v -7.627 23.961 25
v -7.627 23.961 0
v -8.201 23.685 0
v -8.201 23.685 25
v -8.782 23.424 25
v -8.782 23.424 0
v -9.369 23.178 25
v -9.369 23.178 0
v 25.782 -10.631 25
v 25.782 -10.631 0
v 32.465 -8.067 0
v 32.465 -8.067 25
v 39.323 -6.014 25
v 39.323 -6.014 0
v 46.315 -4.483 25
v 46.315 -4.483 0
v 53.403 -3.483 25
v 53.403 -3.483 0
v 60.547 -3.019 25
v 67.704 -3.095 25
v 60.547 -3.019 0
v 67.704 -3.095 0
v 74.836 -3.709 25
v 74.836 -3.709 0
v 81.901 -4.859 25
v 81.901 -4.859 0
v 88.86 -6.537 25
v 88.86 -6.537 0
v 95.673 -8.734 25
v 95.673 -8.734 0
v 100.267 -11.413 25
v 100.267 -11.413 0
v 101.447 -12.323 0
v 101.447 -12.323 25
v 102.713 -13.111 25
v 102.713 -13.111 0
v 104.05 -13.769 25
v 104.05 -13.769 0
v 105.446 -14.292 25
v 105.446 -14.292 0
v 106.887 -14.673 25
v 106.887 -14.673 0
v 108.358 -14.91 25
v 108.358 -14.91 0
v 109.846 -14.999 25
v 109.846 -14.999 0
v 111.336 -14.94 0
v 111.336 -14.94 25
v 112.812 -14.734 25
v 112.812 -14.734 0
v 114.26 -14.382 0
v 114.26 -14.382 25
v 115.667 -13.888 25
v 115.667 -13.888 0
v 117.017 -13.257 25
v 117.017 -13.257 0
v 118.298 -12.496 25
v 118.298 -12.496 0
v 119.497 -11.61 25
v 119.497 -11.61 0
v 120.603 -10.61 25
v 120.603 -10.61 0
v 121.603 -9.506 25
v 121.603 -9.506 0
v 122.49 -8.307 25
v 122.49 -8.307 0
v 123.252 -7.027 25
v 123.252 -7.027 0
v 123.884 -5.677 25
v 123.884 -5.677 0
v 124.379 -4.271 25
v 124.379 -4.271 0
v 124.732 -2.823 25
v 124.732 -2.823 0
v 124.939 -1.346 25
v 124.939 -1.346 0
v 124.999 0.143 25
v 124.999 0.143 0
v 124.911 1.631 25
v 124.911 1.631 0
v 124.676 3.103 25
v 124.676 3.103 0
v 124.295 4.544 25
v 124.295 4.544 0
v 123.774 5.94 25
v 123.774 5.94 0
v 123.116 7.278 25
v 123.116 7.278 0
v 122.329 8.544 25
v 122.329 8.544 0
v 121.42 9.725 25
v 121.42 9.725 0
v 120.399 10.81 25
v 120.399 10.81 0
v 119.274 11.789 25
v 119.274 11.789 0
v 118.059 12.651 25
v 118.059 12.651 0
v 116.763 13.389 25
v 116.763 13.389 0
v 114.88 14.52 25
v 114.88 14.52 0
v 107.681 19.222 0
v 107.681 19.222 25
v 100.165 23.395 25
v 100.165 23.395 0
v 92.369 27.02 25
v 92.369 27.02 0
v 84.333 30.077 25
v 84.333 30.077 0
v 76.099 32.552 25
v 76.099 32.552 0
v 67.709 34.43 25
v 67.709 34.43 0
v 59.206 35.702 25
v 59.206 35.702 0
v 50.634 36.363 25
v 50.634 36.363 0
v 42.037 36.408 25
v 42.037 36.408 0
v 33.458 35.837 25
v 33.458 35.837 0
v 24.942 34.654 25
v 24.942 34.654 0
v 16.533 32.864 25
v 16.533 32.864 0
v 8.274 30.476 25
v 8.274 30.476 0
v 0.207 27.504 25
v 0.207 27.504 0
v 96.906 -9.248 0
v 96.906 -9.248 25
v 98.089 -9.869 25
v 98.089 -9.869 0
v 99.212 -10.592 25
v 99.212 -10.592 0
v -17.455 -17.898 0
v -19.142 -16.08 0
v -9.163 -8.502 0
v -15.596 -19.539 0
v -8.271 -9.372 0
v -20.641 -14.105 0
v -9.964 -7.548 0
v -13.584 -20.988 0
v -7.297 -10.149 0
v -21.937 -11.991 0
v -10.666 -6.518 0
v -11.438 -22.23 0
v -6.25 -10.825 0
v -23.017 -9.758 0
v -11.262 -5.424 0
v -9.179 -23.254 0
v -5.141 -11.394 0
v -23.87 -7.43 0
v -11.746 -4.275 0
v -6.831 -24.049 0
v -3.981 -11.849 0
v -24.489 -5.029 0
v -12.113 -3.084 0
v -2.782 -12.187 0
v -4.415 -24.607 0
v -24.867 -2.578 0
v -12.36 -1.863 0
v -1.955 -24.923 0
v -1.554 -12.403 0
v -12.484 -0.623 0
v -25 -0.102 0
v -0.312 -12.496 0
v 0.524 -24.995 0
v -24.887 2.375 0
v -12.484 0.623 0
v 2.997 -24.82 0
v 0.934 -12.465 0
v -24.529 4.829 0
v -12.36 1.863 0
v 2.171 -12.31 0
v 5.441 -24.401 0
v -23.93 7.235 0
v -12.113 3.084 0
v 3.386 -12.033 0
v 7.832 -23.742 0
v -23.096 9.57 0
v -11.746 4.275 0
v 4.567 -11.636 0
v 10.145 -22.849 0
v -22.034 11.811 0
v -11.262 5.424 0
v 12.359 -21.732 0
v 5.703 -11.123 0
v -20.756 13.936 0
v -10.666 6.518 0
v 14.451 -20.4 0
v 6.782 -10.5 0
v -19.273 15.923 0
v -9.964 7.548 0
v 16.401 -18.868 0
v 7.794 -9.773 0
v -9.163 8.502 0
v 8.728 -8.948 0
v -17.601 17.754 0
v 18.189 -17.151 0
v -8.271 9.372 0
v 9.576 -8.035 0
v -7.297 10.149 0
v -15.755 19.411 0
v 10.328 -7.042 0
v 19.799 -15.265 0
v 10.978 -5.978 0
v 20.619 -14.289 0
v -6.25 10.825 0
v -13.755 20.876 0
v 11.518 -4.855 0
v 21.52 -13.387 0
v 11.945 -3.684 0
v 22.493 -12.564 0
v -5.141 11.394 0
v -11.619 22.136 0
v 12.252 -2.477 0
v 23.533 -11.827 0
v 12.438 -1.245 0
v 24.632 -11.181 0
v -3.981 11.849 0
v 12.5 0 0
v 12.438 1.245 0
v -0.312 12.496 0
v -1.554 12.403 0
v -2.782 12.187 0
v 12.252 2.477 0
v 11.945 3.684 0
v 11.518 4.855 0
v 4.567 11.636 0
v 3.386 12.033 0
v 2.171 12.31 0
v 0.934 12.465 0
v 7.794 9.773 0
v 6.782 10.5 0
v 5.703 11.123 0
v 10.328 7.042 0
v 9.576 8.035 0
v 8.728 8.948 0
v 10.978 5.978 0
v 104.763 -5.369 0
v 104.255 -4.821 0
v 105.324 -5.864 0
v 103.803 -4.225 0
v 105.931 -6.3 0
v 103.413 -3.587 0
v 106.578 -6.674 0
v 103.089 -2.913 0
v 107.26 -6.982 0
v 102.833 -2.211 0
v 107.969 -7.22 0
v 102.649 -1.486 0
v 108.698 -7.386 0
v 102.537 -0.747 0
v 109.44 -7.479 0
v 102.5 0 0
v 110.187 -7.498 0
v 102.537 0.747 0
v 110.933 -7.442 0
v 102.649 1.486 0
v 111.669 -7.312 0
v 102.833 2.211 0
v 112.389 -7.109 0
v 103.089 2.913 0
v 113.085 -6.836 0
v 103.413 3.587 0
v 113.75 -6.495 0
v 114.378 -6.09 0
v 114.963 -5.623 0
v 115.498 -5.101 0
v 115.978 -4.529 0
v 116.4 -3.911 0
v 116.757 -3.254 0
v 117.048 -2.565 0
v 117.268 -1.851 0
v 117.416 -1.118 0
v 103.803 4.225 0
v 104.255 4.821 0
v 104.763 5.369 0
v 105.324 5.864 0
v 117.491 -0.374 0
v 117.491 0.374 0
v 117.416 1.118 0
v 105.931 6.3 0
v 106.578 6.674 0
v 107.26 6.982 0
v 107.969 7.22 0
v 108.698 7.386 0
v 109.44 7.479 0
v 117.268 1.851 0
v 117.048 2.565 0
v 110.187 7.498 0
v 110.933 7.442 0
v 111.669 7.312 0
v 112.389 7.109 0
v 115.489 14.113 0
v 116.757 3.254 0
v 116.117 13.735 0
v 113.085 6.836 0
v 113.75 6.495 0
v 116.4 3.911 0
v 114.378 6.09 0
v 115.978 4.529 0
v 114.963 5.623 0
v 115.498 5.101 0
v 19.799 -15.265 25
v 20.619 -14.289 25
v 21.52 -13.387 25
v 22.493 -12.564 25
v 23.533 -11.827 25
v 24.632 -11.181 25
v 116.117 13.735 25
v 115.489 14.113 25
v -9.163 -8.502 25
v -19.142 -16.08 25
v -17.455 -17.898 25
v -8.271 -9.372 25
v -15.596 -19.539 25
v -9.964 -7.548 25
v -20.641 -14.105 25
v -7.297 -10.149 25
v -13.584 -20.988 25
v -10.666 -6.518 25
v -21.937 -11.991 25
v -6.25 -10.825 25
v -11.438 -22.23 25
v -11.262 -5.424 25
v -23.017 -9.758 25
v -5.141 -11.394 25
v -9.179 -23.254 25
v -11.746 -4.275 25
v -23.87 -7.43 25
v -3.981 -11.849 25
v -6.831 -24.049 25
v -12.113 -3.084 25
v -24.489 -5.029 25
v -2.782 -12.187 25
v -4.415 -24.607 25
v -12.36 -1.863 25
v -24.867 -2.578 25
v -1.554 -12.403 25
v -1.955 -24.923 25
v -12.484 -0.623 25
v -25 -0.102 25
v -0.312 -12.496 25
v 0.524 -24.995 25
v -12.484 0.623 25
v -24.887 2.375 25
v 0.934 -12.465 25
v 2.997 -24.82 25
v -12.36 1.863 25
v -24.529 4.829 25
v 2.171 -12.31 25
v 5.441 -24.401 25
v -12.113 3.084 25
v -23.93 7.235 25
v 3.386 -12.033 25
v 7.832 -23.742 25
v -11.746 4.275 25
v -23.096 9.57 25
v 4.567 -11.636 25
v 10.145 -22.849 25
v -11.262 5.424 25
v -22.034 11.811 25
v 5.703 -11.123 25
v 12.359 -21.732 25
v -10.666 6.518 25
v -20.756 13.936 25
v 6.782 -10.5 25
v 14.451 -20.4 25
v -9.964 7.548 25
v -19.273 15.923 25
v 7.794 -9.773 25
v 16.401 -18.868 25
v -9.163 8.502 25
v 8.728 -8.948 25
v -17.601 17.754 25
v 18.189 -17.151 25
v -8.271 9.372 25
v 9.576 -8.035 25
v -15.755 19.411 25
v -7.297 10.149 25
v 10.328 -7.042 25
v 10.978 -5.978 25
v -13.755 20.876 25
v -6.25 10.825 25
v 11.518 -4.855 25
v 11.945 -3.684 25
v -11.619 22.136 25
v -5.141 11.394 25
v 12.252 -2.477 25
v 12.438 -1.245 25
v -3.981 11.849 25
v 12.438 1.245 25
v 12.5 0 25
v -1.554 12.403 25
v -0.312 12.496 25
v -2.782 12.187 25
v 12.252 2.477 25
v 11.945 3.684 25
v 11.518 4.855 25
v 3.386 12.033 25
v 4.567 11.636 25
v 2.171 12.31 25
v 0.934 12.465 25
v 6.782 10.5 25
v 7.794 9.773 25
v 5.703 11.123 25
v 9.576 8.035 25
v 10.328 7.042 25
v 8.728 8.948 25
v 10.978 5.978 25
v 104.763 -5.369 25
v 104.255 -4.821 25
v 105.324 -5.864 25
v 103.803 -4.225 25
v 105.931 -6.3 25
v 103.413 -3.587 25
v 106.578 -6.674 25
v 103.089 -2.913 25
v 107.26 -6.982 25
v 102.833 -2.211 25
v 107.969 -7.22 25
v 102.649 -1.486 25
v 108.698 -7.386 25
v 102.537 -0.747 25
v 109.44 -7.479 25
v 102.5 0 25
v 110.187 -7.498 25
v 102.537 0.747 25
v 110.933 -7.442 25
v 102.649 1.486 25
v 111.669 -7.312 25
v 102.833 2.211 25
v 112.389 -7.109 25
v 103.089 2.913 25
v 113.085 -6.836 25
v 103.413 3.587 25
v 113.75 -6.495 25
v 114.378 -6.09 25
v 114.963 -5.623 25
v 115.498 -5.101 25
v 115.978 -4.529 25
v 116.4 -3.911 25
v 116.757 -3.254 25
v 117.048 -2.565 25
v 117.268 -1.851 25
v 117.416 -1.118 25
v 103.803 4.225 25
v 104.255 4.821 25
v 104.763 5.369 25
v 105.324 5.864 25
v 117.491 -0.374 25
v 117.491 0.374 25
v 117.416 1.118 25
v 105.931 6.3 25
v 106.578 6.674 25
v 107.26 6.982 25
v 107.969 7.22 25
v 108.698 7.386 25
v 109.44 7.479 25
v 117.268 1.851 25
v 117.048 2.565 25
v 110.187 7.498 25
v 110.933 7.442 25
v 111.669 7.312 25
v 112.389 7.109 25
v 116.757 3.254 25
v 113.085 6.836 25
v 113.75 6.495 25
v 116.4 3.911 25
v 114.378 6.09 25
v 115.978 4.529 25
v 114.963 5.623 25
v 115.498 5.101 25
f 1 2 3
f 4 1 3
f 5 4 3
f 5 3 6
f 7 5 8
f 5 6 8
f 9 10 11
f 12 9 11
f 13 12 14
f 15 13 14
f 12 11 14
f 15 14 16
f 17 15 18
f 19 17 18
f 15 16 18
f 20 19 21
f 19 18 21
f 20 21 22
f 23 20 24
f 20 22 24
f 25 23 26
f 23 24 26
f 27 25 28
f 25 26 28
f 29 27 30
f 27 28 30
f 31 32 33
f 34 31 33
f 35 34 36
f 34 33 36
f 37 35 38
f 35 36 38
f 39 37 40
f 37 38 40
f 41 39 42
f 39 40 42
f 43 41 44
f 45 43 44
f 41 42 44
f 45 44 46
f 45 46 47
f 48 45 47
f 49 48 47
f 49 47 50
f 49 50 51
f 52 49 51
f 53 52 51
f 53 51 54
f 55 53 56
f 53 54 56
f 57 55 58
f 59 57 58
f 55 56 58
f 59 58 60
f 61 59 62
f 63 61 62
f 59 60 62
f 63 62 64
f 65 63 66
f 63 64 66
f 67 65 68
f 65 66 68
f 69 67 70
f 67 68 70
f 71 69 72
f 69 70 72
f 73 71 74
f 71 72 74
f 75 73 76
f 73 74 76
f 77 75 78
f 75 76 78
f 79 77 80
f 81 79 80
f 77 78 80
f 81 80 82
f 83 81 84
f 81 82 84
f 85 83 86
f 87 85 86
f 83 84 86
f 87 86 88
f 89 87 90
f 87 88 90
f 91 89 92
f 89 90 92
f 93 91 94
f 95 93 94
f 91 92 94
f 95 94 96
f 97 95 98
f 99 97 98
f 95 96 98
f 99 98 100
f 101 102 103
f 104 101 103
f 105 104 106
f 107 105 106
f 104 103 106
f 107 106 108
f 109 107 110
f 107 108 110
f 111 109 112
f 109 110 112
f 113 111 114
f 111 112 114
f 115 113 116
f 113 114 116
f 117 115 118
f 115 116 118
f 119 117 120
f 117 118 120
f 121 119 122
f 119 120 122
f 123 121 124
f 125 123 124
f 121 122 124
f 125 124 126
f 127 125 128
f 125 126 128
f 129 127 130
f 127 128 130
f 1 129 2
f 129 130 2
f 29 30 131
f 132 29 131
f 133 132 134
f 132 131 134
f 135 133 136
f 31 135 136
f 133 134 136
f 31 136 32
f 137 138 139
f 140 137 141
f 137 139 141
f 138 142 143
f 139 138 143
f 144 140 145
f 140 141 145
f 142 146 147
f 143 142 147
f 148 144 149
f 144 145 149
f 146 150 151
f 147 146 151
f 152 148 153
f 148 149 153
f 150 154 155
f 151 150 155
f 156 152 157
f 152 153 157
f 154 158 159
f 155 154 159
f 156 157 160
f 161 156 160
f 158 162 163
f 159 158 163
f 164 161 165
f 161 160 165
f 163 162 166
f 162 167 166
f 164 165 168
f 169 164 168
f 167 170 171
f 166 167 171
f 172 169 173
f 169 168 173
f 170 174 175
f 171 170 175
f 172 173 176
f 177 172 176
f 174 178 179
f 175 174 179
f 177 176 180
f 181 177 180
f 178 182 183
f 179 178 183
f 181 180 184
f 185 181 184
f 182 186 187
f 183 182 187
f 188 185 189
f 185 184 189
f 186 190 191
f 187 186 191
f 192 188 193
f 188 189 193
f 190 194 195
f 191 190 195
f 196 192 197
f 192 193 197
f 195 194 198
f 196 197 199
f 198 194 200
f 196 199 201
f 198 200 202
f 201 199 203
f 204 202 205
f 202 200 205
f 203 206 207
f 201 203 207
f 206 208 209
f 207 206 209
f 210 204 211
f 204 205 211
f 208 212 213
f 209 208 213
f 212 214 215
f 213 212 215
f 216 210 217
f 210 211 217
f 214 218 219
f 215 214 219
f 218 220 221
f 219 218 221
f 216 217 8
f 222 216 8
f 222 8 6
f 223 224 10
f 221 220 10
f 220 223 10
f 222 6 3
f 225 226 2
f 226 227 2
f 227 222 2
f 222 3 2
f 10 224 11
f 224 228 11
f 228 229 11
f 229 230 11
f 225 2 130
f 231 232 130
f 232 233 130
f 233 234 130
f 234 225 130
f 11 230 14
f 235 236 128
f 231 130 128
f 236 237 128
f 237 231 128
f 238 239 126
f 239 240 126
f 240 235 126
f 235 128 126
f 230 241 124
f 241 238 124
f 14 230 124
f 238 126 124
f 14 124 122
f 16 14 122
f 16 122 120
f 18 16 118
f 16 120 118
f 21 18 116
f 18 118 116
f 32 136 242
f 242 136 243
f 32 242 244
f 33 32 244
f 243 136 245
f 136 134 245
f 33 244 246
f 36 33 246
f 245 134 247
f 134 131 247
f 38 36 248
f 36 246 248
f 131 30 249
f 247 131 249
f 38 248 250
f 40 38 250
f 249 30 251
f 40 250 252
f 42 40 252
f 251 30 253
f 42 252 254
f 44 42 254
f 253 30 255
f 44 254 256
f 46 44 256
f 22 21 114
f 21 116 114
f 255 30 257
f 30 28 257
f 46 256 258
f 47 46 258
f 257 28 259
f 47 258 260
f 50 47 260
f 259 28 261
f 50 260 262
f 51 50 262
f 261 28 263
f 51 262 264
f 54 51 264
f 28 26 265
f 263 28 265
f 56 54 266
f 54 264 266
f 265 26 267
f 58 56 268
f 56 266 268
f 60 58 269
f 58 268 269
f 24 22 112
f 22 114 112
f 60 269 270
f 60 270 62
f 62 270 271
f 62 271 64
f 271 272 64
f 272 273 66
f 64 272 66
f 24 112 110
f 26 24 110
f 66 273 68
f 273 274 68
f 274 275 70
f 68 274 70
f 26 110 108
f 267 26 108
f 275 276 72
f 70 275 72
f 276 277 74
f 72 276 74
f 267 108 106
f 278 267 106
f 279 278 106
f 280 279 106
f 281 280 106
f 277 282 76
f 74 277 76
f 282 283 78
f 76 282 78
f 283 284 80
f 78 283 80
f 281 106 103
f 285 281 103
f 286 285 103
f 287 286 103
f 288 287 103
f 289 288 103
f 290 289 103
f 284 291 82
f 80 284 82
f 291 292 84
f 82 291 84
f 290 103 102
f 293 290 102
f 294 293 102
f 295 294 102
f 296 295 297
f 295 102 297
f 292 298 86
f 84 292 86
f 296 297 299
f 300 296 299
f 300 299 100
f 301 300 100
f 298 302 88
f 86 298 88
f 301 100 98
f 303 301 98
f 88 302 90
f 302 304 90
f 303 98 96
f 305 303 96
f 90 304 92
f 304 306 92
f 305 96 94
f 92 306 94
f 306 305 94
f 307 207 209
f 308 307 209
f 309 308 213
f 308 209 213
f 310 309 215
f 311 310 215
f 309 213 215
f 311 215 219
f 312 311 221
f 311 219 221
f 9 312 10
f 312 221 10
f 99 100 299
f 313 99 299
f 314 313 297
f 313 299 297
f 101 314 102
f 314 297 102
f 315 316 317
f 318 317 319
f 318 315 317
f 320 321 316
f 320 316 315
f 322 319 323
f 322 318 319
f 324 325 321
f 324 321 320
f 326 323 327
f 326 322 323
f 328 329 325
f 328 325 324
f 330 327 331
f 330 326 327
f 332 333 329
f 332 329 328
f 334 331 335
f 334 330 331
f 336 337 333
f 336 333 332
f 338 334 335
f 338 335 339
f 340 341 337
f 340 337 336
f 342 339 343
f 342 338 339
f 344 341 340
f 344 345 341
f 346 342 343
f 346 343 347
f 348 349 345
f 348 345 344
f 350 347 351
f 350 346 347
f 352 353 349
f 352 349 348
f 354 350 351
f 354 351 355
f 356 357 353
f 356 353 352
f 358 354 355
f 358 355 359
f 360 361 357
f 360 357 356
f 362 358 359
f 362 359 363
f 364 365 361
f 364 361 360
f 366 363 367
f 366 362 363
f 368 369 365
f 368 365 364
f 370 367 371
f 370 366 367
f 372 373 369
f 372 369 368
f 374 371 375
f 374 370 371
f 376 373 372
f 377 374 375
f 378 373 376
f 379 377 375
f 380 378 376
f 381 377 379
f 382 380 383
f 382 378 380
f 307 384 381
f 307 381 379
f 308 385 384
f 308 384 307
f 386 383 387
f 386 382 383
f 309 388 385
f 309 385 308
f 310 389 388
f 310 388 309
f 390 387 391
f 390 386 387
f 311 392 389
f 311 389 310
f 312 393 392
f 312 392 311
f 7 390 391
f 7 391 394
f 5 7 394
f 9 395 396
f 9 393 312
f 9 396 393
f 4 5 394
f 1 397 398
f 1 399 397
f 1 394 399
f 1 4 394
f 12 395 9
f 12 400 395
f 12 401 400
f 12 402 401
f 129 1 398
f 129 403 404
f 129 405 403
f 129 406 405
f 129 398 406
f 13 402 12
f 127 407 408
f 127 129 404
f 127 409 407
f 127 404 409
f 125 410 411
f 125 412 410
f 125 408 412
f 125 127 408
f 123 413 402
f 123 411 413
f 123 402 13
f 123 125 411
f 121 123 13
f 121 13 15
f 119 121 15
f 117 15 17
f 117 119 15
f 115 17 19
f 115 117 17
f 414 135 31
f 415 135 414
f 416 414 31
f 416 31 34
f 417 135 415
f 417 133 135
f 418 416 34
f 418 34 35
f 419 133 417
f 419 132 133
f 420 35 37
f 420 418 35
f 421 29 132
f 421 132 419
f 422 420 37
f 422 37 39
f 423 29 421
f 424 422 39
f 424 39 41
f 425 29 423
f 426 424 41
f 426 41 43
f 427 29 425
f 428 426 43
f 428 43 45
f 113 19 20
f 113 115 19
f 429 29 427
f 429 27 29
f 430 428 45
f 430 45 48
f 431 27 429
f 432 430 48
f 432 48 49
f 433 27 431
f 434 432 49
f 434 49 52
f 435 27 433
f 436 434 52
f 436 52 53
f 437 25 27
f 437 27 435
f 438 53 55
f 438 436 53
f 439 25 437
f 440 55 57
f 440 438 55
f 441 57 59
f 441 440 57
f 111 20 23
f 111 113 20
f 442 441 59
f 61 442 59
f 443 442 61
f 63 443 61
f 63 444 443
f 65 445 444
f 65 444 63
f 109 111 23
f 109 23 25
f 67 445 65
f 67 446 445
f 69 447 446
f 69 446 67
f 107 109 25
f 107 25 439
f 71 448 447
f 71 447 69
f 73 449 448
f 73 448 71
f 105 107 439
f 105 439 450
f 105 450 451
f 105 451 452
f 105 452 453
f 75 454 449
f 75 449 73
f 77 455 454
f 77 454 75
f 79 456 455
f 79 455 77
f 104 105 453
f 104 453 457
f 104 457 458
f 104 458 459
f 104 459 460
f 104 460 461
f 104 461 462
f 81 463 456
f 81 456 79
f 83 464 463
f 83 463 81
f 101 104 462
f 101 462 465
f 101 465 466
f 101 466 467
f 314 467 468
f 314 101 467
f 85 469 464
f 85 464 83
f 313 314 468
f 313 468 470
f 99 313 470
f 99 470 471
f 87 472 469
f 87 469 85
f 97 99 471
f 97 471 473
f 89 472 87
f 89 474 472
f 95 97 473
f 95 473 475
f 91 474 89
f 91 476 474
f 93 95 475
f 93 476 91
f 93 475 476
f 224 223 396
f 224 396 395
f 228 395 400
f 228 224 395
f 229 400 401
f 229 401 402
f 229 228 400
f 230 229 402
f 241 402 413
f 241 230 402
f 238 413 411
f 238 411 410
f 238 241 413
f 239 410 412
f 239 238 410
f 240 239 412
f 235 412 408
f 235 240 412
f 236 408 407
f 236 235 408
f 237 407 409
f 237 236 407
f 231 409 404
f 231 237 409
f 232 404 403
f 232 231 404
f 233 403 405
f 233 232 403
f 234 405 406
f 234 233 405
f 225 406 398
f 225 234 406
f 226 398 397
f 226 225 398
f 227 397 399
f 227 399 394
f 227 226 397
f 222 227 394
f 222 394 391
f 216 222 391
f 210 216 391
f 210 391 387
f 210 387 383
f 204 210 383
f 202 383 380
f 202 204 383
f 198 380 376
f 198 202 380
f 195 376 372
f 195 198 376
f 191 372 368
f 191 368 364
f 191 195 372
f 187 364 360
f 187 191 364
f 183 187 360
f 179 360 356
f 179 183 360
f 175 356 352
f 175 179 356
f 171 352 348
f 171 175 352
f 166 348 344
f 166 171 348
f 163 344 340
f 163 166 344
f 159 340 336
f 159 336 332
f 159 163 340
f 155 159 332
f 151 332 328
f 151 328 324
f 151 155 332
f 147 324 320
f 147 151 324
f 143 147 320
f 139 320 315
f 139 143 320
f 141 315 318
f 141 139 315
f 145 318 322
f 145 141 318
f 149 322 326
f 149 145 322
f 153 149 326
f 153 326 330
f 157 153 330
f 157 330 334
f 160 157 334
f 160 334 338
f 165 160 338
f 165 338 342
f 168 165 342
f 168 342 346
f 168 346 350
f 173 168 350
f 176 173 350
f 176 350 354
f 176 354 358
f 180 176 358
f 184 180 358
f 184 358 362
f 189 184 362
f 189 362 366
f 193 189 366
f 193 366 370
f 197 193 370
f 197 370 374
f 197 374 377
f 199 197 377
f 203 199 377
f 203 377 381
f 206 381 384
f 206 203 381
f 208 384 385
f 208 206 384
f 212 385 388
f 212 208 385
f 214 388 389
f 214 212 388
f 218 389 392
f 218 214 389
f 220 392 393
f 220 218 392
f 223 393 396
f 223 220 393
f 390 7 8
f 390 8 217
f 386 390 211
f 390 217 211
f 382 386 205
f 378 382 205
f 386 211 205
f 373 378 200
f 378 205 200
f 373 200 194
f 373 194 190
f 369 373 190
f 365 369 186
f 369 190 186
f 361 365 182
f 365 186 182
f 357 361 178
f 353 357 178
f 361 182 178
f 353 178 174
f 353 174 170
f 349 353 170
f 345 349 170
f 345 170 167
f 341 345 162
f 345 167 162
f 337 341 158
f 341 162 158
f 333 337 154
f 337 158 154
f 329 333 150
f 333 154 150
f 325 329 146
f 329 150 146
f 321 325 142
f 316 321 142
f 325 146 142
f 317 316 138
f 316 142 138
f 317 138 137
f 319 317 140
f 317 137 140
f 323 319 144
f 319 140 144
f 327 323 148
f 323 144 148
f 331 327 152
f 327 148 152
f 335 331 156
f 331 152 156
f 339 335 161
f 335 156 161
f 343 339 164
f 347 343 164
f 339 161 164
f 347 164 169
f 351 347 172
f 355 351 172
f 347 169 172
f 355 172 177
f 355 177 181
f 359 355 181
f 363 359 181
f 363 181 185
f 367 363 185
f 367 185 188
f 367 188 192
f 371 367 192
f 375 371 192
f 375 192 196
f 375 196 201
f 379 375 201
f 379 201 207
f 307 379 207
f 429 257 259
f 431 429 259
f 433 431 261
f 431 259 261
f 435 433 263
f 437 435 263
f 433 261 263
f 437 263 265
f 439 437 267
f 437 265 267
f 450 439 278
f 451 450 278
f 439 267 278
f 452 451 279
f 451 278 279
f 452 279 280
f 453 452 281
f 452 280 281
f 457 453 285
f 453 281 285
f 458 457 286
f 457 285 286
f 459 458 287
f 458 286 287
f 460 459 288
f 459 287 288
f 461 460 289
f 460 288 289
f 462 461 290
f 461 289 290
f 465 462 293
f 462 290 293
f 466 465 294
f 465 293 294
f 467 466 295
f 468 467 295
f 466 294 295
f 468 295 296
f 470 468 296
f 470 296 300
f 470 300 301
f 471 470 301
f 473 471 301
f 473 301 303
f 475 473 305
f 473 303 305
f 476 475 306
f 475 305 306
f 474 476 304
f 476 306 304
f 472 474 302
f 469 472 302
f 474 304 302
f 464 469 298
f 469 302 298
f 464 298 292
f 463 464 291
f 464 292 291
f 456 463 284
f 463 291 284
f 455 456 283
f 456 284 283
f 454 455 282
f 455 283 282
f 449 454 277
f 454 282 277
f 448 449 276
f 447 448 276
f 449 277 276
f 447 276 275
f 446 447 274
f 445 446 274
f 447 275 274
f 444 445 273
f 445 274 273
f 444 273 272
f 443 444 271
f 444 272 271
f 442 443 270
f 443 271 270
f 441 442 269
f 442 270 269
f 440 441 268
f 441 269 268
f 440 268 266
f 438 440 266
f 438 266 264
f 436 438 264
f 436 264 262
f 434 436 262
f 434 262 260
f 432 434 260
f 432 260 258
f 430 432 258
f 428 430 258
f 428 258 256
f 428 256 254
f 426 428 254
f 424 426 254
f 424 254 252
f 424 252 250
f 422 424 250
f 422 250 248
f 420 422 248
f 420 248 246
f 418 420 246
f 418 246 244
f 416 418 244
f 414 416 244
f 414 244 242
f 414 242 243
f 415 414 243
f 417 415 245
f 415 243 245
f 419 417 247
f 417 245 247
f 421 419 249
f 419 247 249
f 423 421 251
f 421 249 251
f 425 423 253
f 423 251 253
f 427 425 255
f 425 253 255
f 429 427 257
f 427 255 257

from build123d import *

# Parameters (mm, degrees)
F0_R     = 12.5
F1_DEPTH = 25


with BuildPart() as f1:
    # F0 (on Top) → F1 (new body)
    with BuildSketch(Plane.XY):
        Circle(F0_R)
        with BuildLine():
            ThreePointArc((117.5, 0), (110, 7.5), (102.5, 0))
            ThreePointArc((102.5, 0), (110, -7.5), (117.5, 0))
        make_face()
        with BuildLine():
            ThreePointArc((-7.627142, 23.960834), (-8.490667, 23.55277), (-9.369148, 23.177987))
            ThreePointArc((-9.369148, 23.177987), (-19.916156, -15.111146), (19.798746, -15.264653))
            ThreePointArc((19.798746, -15.264653), (22.493335, -12.564186), (25.782002, -10.630792))
            ThreePointArc((25.782002, -10.630792), (60.546561, -3.019212), (95.672722, -8.734419))
            ThreePointArc((95.672722, -8.734419), (98.089359, -9.868623), (100.266669, -11.41325))
            ThreePointArc((100.266669, -11.41325), (122.489592, -8.307231), (116.763269, 13.388734))
            ThreePointArc((116.763269, 13.388734), (115.800812, 13.920051), (114.879855, 14.520434))
            ThreePointArc((114.879855, 14.520434), (54.926268, 36.109448), (-7.627142, 23.960834))
        make_face()
        Circle(F0_R, mode=Mode.SUBTRACT)
        with BuildLine():
            ThreePointArc((117.5, 0), (110, -7.5), (102.5, 0))
            ThreePointArc((102.5, 0), (110, 7.5), (117.5, 0))
        make_face(mode=Mode.SUBTRACT)
    extrude(amount=F1_DEPTH)


solid = f1.part
